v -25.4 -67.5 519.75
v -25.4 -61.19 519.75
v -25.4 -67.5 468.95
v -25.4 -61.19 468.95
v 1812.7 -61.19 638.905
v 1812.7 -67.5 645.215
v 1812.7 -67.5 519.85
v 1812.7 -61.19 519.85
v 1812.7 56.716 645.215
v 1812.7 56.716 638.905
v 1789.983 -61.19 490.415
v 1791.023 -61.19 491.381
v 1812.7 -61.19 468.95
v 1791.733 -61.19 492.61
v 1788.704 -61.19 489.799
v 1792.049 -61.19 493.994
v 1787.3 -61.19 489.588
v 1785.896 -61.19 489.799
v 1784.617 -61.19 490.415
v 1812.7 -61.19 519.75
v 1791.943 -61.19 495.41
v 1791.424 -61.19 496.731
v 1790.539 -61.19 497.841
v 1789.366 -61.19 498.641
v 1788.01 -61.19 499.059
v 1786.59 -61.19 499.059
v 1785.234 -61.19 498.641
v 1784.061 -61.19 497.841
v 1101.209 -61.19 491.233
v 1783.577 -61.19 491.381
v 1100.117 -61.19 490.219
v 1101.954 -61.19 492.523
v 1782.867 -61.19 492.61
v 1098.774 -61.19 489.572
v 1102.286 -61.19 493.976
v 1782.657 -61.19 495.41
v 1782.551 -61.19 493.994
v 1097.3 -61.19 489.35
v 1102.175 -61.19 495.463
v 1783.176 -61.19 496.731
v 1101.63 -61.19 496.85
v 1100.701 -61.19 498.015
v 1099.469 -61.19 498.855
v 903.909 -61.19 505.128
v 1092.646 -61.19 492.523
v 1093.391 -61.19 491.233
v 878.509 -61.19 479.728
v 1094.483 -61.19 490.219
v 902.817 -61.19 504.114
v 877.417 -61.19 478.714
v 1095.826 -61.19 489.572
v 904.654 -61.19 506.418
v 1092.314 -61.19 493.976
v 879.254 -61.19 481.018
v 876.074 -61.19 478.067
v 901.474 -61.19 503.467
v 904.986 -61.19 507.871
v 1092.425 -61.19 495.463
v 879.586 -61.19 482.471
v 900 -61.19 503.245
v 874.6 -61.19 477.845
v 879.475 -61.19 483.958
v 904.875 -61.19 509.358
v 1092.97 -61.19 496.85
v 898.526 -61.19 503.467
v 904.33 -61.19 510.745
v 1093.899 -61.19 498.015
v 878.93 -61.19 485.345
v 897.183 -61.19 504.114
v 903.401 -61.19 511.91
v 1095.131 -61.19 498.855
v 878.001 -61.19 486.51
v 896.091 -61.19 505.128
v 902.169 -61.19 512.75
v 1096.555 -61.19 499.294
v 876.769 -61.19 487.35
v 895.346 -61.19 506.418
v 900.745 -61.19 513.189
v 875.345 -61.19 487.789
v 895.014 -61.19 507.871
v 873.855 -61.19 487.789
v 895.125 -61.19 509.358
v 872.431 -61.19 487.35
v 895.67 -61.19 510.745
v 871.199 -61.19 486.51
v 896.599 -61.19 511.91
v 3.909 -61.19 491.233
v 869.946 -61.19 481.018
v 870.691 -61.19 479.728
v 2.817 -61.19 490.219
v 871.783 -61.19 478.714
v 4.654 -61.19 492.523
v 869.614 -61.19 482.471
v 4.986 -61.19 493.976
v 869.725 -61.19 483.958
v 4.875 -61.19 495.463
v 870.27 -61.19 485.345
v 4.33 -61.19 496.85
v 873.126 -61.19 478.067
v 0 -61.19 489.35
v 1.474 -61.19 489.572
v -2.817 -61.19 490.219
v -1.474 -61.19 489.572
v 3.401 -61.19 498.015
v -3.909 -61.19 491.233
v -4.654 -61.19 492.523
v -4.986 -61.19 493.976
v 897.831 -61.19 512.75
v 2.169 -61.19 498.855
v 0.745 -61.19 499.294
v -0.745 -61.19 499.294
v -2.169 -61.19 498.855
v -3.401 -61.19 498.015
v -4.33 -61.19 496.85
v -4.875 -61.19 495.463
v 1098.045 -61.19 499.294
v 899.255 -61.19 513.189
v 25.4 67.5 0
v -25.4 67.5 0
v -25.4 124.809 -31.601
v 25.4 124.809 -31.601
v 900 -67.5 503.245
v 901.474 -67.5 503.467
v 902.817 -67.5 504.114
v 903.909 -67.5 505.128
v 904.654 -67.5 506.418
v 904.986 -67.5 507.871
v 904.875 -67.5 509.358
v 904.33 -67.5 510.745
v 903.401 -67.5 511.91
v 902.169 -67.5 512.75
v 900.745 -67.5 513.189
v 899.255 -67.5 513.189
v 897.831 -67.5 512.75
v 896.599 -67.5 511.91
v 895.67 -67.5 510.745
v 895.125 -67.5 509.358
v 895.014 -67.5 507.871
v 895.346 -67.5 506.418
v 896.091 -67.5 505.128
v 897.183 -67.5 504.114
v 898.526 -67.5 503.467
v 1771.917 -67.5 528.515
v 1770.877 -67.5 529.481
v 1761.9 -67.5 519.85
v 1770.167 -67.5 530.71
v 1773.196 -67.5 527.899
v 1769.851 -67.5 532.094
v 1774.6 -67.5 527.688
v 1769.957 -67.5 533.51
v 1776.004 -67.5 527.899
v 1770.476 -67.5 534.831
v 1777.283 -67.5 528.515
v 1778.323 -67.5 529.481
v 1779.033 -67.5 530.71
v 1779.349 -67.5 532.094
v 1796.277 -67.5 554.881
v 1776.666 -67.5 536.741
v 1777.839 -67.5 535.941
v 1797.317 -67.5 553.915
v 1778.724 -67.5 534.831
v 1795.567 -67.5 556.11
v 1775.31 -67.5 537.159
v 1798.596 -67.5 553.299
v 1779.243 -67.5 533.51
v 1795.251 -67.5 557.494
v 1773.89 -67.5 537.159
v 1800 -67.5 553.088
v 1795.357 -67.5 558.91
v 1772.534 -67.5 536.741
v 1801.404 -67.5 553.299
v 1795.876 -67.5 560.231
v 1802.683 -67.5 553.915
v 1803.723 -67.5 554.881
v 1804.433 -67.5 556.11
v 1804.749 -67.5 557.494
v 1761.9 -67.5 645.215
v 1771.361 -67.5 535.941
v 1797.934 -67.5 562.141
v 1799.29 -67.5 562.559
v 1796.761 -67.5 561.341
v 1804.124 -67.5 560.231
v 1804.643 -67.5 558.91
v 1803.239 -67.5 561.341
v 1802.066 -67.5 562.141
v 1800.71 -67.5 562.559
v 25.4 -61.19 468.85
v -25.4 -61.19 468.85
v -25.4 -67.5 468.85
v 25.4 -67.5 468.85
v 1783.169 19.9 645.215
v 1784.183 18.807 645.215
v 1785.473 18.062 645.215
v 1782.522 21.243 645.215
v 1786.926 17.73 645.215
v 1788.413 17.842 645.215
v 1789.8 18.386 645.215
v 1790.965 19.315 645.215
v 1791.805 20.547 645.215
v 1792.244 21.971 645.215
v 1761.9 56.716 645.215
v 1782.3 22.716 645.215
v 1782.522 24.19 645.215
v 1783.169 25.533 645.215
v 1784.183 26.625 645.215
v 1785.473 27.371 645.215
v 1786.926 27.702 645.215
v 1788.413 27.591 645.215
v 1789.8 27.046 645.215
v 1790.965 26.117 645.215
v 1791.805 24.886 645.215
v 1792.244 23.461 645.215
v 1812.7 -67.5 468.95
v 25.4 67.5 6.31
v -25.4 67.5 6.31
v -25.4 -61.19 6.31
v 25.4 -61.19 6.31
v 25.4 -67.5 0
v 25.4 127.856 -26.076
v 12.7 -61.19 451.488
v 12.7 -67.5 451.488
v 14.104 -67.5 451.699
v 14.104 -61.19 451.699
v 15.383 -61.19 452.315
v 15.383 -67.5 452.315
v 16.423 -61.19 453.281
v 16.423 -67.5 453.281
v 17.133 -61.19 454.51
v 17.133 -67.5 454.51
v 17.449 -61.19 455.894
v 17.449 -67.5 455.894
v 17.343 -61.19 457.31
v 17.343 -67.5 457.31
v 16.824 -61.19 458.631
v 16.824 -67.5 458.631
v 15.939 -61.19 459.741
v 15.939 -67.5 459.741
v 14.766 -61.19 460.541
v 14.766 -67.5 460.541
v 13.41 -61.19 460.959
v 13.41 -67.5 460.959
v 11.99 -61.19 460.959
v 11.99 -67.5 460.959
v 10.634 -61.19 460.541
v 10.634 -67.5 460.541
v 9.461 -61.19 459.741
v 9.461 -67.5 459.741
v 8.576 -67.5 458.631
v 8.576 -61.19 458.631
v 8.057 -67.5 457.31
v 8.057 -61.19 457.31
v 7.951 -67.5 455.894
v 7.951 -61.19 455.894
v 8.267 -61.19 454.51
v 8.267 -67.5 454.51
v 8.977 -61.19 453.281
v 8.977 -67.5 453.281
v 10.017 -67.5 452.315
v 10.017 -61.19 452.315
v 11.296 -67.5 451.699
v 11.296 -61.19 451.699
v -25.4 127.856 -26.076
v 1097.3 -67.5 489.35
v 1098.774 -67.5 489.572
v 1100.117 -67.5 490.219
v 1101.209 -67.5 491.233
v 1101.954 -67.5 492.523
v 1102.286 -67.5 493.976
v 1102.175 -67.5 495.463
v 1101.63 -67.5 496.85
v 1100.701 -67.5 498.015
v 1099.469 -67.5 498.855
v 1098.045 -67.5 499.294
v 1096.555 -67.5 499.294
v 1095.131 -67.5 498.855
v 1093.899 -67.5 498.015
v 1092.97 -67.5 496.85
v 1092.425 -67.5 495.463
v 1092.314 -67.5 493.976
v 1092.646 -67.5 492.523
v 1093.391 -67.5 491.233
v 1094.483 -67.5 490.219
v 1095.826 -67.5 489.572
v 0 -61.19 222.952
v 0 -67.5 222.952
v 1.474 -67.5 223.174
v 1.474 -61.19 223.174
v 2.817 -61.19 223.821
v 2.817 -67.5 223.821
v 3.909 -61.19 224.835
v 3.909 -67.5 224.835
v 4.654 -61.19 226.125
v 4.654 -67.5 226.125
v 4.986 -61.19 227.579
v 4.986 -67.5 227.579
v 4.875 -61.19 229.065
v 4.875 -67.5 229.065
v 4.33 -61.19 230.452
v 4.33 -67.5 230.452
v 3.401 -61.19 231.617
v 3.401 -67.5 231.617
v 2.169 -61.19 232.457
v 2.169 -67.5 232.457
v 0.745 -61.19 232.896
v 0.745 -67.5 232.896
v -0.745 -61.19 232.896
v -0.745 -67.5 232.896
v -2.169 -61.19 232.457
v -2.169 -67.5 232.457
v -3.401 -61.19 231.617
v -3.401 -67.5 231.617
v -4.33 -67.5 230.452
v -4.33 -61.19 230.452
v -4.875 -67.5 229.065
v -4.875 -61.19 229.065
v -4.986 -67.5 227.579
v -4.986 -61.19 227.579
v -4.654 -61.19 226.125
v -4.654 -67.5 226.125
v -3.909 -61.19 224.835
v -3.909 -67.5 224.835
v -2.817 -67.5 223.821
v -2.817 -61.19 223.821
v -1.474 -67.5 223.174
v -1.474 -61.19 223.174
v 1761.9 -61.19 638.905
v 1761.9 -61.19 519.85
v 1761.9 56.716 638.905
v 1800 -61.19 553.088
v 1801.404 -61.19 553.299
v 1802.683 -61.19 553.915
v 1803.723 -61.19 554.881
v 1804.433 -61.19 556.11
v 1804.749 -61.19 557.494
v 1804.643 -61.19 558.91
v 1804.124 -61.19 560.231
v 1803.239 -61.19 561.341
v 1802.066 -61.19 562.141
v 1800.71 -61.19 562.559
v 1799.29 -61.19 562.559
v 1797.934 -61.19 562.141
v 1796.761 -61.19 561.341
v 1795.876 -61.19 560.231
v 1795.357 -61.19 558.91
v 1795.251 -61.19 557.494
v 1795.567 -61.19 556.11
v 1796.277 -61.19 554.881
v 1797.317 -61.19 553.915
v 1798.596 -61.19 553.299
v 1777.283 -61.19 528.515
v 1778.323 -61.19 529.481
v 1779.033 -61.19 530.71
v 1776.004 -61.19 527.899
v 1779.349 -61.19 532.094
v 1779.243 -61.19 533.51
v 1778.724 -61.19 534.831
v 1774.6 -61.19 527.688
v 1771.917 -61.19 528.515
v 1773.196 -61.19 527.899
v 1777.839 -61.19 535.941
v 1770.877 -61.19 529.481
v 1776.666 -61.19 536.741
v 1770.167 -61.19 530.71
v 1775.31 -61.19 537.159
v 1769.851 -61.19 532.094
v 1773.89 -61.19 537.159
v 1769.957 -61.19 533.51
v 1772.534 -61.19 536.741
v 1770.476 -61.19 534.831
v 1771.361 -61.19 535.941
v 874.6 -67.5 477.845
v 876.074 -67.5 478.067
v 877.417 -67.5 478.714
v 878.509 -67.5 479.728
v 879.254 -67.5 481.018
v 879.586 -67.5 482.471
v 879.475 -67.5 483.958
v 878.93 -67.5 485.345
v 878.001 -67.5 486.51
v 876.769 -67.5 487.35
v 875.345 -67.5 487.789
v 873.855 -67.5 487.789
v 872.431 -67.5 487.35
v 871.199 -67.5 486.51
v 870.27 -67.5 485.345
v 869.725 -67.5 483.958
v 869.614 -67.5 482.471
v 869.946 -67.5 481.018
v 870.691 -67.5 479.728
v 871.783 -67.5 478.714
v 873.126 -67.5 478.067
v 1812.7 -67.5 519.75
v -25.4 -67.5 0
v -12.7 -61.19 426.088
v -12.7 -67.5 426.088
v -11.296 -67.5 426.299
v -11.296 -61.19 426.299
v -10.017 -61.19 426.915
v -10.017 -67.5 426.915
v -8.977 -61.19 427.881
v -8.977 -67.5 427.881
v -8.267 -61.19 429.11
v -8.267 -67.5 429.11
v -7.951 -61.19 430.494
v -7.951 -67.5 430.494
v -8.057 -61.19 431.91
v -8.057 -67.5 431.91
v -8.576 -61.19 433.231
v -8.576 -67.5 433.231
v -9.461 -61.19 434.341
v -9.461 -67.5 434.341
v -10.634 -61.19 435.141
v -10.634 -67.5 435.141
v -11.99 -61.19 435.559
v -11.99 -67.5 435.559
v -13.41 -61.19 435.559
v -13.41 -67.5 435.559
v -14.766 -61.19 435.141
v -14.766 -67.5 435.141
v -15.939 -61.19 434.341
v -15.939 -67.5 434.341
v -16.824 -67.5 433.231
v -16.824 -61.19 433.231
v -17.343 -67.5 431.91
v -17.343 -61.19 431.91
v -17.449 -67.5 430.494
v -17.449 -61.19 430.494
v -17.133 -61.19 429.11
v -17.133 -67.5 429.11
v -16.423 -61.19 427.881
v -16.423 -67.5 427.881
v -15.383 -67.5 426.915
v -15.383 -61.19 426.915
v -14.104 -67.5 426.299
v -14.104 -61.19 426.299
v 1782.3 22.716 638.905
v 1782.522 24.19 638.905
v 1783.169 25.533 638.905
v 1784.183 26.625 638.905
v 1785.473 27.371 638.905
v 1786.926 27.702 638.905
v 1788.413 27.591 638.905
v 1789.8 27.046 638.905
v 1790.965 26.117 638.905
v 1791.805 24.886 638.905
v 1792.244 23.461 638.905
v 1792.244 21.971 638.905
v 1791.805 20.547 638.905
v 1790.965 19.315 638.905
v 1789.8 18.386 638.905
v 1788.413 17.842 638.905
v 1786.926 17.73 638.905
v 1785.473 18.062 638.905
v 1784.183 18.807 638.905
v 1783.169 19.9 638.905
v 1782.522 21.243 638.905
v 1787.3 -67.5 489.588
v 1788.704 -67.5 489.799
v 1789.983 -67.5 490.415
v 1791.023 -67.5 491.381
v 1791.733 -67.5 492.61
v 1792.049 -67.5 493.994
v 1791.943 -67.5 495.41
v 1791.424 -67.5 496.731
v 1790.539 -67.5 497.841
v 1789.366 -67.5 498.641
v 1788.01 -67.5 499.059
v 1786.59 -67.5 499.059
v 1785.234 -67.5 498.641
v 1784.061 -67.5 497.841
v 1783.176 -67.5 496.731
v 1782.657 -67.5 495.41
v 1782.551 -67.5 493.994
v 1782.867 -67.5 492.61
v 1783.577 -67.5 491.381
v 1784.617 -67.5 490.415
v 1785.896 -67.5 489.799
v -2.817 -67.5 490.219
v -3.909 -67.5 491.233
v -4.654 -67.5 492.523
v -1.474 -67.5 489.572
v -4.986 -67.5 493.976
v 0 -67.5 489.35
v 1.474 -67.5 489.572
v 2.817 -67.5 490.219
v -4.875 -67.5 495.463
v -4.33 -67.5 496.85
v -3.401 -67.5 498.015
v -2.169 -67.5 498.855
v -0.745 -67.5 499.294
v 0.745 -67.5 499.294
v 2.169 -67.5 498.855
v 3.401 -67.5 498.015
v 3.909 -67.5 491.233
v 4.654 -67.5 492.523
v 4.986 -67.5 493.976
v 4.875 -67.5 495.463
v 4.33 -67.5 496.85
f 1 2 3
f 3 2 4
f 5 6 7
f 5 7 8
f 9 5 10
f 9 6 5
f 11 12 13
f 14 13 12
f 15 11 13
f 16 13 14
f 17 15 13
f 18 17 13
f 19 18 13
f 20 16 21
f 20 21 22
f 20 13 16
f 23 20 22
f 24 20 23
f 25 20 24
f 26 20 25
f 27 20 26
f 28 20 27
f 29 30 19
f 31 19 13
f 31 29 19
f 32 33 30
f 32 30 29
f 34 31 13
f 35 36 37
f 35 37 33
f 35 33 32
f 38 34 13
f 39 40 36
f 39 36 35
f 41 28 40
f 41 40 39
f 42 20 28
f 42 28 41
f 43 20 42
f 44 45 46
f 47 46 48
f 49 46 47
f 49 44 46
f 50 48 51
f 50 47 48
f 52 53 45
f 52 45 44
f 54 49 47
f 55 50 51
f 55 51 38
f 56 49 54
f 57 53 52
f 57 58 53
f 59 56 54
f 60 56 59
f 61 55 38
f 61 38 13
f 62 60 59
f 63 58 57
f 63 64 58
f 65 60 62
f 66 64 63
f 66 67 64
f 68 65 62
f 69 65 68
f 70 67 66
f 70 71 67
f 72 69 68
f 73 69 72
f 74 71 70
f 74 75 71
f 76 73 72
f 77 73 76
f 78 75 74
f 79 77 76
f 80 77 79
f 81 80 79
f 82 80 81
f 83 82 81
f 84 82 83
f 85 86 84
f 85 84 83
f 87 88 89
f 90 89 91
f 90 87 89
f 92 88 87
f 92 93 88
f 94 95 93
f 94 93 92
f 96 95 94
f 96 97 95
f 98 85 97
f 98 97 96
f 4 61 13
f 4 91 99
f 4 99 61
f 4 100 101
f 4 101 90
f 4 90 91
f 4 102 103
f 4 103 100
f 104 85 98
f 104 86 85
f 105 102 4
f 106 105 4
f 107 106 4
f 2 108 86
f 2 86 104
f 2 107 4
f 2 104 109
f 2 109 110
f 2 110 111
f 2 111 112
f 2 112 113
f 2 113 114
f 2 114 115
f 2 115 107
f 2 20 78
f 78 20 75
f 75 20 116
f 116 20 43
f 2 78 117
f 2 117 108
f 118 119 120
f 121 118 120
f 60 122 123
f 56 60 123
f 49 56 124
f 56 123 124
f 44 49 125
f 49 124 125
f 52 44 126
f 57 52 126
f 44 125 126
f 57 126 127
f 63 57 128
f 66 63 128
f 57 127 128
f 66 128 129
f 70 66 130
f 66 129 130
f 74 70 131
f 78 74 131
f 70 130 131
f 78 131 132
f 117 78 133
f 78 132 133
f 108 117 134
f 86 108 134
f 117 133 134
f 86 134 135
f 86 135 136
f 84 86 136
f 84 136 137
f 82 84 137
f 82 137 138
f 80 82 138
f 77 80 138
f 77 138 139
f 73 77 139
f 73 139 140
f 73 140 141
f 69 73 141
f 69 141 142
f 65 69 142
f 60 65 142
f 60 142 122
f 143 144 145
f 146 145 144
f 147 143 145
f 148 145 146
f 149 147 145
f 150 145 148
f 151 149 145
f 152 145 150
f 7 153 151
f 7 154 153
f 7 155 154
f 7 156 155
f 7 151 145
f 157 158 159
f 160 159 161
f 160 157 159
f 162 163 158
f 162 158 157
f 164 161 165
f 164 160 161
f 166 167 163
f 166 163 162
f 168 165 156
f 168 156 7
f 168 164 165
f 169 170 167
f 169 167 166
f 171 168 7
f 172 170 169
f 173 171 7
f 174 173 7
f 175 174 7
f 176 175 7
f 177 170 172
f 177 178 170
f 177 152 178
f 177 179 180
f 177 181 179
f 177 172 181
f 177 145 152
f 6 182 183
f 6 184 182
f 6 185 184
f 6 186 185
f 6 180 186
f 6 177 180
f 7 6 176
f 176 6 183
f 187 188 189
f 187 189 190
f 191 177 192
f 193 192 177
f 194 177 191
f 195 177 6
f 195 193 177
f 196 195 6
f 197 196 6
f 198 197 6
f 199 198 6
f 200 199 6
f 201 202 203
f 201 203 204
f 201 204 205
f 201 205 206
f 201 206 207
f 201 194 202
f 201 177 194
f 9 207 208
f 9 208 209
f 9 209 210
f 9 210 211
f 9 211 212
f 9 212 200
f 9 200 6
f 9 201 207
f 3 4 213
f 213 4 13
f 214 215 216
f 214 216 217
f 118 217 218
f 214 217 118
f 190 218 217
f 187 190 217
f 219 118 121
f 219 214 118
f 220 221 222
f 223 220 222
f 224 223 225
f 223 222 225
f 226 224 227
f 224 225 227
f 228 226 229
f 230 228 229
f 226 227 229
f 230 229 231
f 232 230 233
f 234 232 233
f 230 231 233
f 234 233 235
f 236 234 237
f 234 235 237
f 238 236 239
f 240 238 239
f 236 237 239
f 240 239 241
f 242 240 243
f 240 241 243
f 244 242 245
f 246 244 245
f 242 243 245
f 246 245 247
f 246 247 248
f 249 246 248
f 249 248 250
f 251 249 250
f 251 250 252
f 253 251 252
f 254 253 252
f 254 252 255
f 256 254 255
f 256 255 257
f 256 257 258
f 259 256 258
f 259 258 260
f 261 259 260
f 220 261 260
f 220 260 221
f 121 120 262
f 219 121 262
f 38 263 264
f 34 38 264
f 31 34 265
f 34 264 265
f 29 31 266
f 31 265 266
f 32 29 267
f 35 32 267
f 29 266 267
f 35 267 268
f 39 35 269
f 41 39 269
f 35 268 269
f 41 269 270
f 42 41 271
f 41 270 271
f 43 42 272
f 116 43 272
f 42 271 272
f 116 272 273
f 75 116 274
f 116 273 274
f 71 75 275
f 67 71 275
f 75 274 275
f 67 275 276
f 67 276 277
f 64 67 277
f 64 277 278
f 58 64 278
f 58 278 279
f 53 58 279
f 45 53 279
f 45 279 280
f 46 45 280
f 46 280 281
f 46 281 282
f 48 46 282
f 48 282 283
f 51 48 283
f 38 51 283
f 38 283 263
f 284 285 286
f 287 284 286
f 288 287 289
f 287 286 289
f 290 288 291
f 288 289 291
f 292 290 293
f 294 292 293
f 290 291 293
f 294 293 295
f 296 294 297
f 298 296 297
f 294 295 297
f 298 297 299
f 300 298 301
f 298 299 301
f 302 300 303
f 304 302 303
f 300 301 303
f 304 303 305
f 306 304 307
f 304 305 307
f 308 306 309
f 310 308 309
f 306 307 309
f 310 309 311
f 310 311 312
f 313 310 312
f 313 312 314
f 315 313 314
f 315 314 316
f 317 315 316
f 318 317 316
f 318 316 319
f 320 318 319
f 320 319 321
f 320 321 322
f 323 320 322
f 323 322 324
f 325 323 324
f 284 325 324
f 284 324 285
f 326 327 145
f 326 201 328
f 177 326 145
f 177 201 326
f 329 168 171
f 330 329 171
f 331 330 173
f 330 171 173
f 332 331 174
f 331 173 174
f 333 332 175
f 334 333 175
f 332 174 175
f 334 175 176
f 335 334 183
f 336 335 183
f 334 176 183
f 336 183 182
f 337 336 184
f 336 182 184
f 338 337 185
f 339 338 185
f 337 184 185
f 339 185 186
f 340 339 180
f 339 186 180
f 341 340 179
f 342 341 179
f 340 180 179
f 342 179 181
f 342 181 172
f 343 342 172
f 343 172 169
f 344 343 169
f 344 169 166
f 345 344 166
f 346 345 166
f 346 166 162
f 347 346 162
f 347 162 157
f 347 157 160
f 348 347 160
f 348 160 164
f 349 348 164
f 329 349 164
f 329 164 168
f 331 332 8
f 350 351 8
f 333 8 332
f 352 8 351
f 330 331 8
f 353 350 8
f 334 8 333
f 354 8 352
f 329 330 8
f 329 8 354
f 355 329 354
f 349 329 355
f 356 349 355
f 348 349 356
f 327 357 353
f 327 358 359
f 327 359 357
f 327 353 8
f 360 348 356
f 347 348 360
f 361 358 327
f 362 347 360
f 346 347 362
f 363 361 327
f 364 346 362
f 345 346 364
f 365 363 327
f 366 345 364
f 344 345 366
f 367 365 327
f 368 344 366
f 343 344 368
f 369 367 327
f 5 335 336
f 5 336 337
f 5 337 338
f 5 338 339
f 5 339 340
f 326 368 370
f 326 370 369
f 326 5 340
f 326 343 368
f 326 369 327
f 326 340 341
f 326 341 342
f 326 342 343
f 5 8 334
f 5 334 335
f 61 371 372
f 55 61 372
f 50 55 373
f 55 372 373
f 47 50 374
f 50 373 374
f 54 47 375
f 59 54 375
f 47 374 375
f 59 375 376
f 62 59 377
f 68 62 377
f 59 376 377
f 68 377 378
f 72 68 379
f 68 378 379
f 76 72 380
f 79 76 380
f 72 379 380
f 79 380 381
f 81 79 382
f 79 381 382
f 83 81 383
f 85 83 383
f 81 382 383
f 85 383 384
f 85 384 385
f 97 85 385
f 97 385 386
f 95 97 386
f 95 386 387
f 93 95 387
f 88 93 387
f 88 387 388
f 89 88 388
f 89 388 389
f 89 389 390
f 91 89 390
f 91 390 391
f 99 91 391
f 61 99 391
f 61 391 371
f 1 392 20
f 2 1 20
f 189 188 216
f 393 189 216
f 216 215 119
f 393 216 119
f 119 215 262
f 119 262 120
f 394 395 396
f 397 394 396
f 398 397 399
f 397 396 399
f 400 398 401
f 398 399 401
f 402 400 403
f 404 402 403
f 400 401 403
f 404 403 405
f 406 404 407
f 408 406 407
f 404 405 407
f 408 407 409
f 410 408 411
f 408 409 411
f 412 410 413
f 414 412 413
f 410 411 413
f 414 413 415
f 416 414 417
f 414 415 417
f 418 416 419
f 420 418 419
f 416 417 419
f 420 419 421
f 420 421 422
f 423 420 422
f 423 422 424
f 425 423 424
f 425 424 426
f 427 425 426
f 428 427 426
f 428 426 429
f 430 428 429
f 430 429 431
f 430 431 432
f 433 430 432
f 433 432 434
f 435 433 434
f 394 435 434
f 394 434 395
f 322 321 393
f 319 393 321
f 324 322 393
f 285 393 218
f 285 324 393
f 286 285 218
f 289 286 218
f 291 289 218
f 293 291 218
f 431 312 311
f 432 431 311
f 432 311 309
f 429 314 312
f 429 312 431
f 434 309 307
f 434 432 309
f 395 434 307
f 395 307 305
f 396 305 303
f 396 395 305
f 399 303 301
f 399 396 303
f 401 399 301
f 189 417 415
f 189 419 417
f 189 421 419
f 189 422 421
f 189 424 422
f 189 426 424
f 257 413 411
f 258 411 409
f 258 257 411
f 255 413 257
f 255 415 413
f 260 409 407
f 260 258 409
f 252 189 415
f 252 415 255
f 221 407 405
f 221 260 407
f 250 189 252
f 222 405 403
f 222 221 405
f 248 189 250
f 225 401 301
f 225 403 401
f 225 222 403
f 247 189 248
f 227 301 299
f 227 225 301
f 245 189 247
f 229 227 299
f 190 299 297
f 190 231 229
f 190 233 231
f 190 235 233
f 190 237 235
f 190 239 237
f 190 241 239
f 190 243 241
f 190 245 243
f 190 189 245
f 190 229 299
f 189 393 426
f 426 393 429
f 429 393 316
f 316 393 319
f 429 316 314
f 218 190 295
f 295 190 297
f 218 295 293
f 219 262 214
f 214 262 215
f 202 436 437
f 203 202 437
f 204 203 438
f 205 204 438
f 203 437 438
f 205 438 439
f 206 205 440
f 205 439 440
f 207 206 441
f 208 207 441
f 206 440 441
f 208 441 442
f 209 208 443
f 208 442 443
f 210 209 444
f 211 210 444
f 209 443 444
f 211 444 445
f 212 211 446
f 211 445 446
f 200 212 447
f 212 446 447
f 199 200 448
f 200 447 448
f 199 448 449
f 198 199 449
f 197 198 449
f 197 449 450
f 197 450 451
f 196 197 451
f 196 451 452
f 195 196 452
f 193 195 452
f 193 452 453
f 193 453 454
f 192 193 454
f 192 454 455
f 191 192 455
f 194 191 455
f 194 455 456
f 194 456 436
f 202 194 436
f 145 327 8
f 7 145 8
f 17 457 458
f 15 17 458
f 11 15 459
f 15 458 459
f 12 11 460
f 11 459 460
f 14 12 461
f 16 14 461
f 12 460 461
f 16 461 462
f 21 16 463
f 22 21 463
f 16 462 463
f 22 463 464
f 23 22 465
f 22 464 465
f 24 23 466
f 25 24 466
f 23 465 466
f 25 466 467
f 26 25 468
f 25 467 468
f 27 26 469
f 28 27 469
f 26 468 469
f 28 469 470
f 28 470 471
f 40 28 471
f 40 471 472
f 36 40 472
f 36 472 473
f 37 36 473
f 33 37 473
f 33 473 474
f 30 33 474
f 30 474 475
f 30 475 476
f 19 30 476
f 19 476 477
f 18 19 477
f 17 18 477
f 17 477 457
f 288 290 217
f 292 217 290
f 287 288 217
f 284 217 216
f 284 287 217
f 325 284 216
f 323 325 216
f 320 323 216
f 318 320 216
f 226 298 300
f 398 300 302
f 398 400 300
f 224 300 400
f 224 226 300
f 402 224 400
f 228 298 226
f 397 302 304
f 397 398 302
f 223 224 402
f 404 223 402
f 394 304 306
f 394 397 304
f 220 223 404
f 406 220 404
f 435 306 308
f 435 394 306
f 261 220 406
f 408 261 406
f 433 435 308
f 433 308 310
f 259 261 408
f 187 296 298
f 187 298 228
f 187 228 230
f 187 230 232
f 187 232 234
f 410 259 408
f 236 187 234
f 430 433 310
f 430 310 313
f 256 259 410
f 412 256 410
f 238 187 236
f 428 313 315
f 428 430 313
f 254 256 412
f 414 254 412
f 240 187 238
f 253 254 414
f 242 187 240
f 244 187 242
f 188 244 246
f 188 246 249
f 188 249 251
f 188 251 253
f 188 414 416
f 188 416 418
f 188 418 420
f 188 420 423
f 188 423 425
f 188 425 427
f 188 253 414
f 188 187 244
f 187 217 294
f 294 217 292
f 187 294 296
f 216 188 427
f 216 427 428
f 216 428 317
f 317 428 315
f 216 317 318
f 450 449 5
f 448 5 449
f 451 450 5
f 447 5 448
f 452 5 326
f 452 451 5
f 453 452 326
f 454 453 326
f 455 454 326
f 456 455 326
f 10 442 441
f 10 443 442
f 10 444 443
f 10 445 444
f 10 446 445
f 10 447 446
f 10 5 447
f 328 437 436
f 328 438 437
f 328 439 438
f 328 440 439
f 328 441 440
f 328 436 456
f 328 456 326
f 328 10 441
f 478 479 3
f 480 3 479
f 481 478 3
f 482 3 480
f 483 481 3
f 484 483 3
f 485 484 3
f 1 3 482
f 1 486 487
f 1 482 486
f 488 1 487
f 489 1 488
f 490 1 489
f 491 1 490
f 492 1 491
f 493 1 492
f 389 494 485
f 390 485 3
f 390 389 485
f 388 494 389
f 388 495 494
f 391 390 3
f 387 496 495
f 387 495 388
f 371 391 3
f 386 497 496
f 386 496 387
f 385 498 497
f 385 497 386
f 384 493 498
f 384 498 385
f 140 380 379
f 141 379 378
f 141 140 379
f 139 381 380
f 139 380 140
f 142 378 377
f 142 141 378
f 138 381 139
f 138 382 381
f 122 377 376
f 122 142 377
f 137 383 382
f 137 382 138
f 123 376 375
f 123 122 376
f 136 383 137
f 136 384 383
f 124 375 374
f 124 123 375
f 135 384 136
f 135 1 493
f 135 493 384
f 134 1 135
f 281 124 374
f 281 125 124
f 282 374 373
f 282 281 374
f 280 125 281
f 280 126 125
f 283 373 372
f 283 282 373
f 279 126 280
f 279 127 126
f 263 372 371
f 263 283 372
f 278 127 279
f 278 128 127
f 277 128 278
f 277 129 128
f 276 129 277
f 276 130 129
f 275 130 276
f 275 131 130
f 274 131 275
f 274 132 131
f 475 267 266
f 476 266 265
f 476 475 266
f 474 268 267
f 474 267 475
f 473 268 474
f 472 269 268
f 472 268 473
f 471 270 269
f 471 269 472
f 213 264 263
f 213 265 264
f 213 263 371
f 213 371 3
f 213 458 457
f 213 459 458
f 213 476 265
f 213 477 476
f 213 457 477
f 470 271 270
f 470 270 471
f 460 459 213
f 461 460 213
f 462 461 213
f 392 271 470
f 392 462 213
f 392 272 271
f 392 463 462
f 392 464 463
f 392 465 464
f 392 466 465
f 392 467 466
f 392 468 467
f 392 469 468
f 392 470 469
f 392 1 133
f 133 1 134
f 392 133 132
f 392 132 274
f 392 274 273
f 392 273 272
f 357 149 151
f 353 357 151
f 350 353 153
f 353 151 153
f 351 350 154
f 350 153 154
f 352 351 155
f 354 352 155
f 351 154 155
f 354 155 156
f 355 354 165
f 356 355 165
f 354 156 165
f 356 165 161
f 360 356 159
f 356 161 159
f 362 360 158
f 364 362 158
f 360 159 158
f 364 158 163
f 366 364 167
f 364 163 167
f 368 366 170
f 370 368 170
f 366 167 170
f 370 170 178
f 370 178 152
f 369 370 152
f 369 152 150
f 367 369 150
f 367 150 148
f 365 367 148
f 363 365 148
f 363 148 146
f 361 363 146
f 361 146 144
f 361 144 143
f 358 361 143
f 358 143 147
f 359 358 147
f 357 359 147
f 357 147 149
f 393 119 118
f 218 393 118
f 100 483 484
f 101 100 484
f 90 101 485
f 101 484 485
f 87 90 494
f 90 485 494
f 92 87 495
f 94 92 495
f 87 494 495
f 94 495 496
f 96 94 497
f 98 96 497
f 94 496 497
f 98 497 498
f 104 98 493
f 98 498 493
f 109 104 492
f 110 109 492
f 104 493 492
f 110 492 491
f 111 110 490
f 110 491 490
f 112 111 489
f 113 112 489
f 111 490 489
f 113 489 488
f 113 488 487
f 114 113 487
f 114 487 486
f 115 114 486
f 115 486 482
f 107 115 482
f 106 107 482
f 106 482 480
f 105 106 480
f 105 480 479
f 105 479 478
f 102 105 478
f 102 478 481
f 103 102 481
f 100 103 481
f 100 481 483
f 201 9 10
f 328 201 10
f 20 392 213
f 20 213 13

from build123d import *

# Parameters (mm, degrees)
CROQUIS2_W              = 50.8
CROQUIS2_H              = 135
SALIENTE_EXTRUIR1_DEPTH = 6.31
CROQUIS3_W              = 50.8
CROQUIS3_H              = 6.31
SALIENTE_EXTRUIR2_DEPTH = 513.44
CROQUIS4_W              = 50.8
CROQUIS4_H              = 6.31
SALIENTE_EXTRUIR3_DEPTH = 1787.3
CROQUIS9_W              = 50.8
CROQUIS9_H              = 6.31
SALIENTE_EXTRUIR4_DEPTH = 98
CROQUIS12_R             = 5
CORTAR_EXTRUIR1_DEPTH   = 10
CORTAR_EXTRUIR2_DEPTH   = 73
CROQUIS16_W             = 47.2
CROQUIS16_H             = 68.495521413
CORTAR_EXTRUIR5_DEPTH   = 10
CROQUIS17_W             = 50.8
CROQUIS17_H             = 0.1
CORTAR_EXTRUIR6_DEPTH   = 50.8
CROQUIS18_W             = 50.8
CROQUIS18_H             = 0.1
CORTAR_EXTRUIR7_DEPTH   = 50.8
CROQUIS19_R             = 5
CORTAR_EXTRUIR8_DEPTH   = 33
CROQUIS20_R             = 5
CORTAR_EXTRUIR9_DEPTH   = 33
CROQUIS21_R             = 5
CORTAR_EXTRUIR10_DEPTH  = 10
CROQUIS23_R             = 4.7625
CORTAR_EXTRUIR11_DEPTH  = 10
CROQUIS24_R             = 4.7625
CORTAR_EXTRUIR12_DEPTH  = 50
CROQUIS25_R             = 4.7625
CORTAR_EXTRUIR13_DEPTH  = 50
CROQUIS26_R             = 5
CORTAR_EXTRUIR14_DEPTH  = 50
CROQUIS27_R             = 5
CORTAR_EXTRUIR15_DEPTH  = 50


with BuildPart() as part:
    # Croquis2 → Saliente-Extruir1 (new body)
    with BuildSketch(Plane.XY):
        Rectangle(CROQUIS2_W, CROQUIS2_H)
    extrude(amount=SALIENTE_EXTRUIR1_DEPTH)

    # Croquis3 → Saliente-Extruir2 (add)
    with BuildSketch(Plane.XY.offset(6.31)):
        with Locations((0, -64.345)):
            Rectangle(CROQUIS3_W, CROQUIS3_H)
    extrude(amount=SALIENTE_EXTRUIR2_DEPTH)

    # Croquis4 → Saliente-Extruir3 (add)
    with BuildSketch(Plane(origin=(25.4, 0, 0), x_dir=(0, 0, -1), z_dir=(1, 0, 0))):
        with Locations((-494.35, -64.345)):
            Rectangle(CROQUIS4_W, CROQUIS4_H)
    extrude(amount=SALIENTE_EXTRUIR3_DEPTH)

    # Barrer2: sweep along a curve in space
    with BuildLine() as barrer2_path:
        Line((1787.3, -64.345, 519.75), (1787.3, -64.345, 642.06))
        Line((1787.3, -64.345, 642.06), (1787.3, 66.675, 642.06))
        Line((1787.3, 66.675, 642.06), (1787.3, 66.675, 1436.06))
    # Croquis9 → Barrer2 (sweep)
    with BuildSketch(Plane.XY.offset(519.75)):
        with Locations((1787.3, -64.345)):
            Rectangle(CROQUIS9_W, CROQUIS9_H)
    sweep(path=barrer2_path.line, transition=Transition.RIGHT)

    # Croquis11 → Saliente-Extruir4 (add)
    with BuildSketch(Plane.ZY.offset(25.4)):
        Polygon((0, 67.5), (-31.60126178, 124.808722595), (-26.075659426, 127.855658535), (6.31, 67.5), align=None)
    extrude(amount=-SALIENTE_EXTRUIR4_DEPTH)

    # Croquis12 → Cortar-Extruir1 (cut)
    with BuildSketch(Plane(origin=(0, 69.83, 0), x_dir=(1, 0, 0), z_dir=(0, 1, 0))):
        with Locations((1787.3, -1403.06)):
            Circle(CROQUIS12_R)
        with Locations((1787.3, -1183.06)):
            Circle(CROQUIS12_R)
    extrude(amount=-CORTAR_EXTRUIR1_DEPTH, mode=Mode.SUBTRACT)

    # Croquis13 → Cortar-Extruir2 (cut)
    with BuildSketch(Plane(origin=(1812.7, 0, 0), x_dir=(0, 0, -1), z_dir=(1, 0, 0))):
        Polygon((-645.215, 56.71628726), (-638.905, 56.71628726), (-638.905, 69.83), (-1436.06, 69.83), (-1436.06, 63.52), (-645.215, 63.52), align=None)
    extrude(amount=-CORTAR_EXTRUIR2_DEPTH, mode=Mode.SUBTRACT)

    # Croquis16 → Cortar-Extruir5 (cut)
    with BuildSketch(Plane(origin=(0, 17.718759704, 33.021634554), x_dir=(1, 0, 0), z_dir=(0, 0.47281426227300877, 0.8811621152723433))):
        with Locations((49, 90.742745493)):
            Rectangle(CROQUIS16_W, CROQUIS16_H)
    extrude(amount=-CORTAR_EXTRUIR5_DEPTH, mode=Mode.SUBTRACT)

    # Croquis17 → Cortar-Extruir6 (cut)
    with BuildSketch(Plane(origin=(0, -61.19, 0), x_dir=(1, 0, 0), z_dir=(0, 1, 0))):
        with Locations((0, -468.9)):
            Rectangle(CROQUIS17_W, CROQUIS17_H)
    extrude(amount=-CORTAR_EXTRUIR6_DEPTH, mode=Mode.SUBTRACT)


with BuildPart() as cortar_extruir6_piece_1:
    # of the separate pieces the step leaves, piece 1, a body of its own (cortar_extruir6_pieces)
    add(part.part.solids().sort_by_distance((-25.4, -61.19, 468.95))[0])

    # Croquis18 → Cortar-Extruir7 (cut)
    with BuildSketch(Plane(origin=(0, -61.19, 0), x_dir=(1, 0, 0), z_dir=(0, 1, 0))):
        with Locations((1787.3, -519.8)):
            Rectangle(CROQUIS18_W, CROQUIS18_H)
    extrude(amount=-CORTAR_EXTRUIR7_DEPTH, mode=Mode.SUBTRACT)


with BuildPart() as cortar_extruir6_piece_2:
    # of the separate pieces the step leaves, piece 2, a body of its own (cortar_extruir6_pieces)
    add(part.part.solids().sort_by_distance((-25.4, -61.19, 6.31))[0])

    # Croquis23 → Cortar-Extruir11 (cut)
    with BuildSketch(Plane(origin=(0, -67.5, 0), x_dir=(-1, 0, 0), z_dir=(0, -1, 0))):
        with Locations((12.7, -430.85)):
            Circle(CROQUIS23_R)
        with Locations((-12.7, -456.25)):
            Circle(CROQUIS23_R)
    extrude(amount=-CORTAR_EXTRUIR11_DEPTH, mode=Mode.SUBTRACT)

    # Croquis26 → Cortar-Extruir14 (cut)
    with BuildSketch(Plane(origin=(0, -67.5, 0), x_dir=(-1, 0, 0), z_dir=(0, -1, 0))):
        with Locations((0, -227.952204666)):
            Circle(CROQUIS26_R)
    extrude(amount=-CORTAR_EXTRUIR14_DEPTH, mode=Mode.SUBTRACT)


with BuildPart() as cortar_extruir7_piece_1:
    # of the separate pieces the step leaves, piece 1, a body of its own (cortar_extruir7_pieces)
    add(cortar_extruir6_piece_1.part.solids().sort_by_distance((-25.4, -61.19, 468.95))[0])

    # Croquis19 → Cortar-Extruir8 (cut)
    with BuildSketch(Plane(origin=(0, -67.5, 0), x_dir=(-1, 0, 0), z_dir=(0, -1, 0))):
        with Locations((-1097.299999999, -494.35)):
            Circle(CROQUIS19_R)
    extrude(amount=-CORTAR_EXTRUIR8_DEPTH, mode=Mode.SUBTRACT)

    # Croquis21 → Cortar-Extruir10 (cut)
    with BuildSketch(Plane(origin=(0, -67.5, 0), x_dir=(-1, 0, 0), z_dir=(0, -1, 0))):
        with Locations((-899.999999999, -508.245)):
            Circle(CROQUIS21_R)
        with Locations((-874.599999999, -482.845)):
            Circle(CROQUIS21_R)
    extrude(amount=-CORTAR_EXTRUIR10_DEPTH, mode=Mode.SUBTRACT)

    # Croquis25 → Cortar-Extruir13 (cut)
    with BuildSketch(Plane(origin=(0, -67.5, 0), x_dir=(-1, 0, 0), z_dir=(0, -1, 0))):
        with Locations((-1787.3, -494.35)):
            Circle(CROQUIS25_R)
    extrude(amount=-CORTAR_EXTRUIR13_DEPTH, mode=Mode.SUBTRACT)

    # Croquis27 → Cortar-Extruir15 (cut)
    with BuildSketch(Plane(origin=(0, -67.5, 0), x_dir=(-1, 0, 0), z_dir=(0, -1, 0))):
        with Locations((0, -494.35)):
            Circle(CROQUIS27_R)
    extrude(amount=-CORTAR_EXTRUIR15_DEPTH, mode=Mode.SUBTRACT)


with BuildPart() as cortar_extruir7_piece_2:
    # of the separate pieces the step leaves, piece 2, a body of its own (cortar_extruir7_pieces)
    add(cortar_extruir6_piece_1.part.solids().sort_by_distance((1812.7, -61.19, 638.905))[0])

    # Croquis20 → Cortar-Extruir9 (cut)
    with BuildSketch(Plane(origin=(0, 0, 638.905), x_dir=(-1, 0, 0), z_dir=(0, 0, -1))):
        with Locations((-1787.3, 22.71628726)):
            Circle(CROQUIS20_R)
    extrude(amount=-CORTAR_EXTRUIR9_DEPTH, mode=Mode.SUBTRACT)

    # Croquis24 → Cortar-Extruir12 (cut)
    with BuildSketch(Plane(origin=(0, -67.5, 0), x_dir=(-1, 0, 0), z_dir=(0, -1, 0))):
        with Locations((-1800, -557.85)):
            Circle(CROQUIS24_R)
        with Locations((-1774.6, -532.45)):
            Circle(CROQUIS24_R)
    extrude(amount=-CORTAR_EXTRUIR12_DEPTH, mode=Mode.SUBTRACT)


solid = Compound([cortar_extruir6_piece_2.part, cortar_extruir7_piece_1.part, cortar_extruir7_piece_2.part])
